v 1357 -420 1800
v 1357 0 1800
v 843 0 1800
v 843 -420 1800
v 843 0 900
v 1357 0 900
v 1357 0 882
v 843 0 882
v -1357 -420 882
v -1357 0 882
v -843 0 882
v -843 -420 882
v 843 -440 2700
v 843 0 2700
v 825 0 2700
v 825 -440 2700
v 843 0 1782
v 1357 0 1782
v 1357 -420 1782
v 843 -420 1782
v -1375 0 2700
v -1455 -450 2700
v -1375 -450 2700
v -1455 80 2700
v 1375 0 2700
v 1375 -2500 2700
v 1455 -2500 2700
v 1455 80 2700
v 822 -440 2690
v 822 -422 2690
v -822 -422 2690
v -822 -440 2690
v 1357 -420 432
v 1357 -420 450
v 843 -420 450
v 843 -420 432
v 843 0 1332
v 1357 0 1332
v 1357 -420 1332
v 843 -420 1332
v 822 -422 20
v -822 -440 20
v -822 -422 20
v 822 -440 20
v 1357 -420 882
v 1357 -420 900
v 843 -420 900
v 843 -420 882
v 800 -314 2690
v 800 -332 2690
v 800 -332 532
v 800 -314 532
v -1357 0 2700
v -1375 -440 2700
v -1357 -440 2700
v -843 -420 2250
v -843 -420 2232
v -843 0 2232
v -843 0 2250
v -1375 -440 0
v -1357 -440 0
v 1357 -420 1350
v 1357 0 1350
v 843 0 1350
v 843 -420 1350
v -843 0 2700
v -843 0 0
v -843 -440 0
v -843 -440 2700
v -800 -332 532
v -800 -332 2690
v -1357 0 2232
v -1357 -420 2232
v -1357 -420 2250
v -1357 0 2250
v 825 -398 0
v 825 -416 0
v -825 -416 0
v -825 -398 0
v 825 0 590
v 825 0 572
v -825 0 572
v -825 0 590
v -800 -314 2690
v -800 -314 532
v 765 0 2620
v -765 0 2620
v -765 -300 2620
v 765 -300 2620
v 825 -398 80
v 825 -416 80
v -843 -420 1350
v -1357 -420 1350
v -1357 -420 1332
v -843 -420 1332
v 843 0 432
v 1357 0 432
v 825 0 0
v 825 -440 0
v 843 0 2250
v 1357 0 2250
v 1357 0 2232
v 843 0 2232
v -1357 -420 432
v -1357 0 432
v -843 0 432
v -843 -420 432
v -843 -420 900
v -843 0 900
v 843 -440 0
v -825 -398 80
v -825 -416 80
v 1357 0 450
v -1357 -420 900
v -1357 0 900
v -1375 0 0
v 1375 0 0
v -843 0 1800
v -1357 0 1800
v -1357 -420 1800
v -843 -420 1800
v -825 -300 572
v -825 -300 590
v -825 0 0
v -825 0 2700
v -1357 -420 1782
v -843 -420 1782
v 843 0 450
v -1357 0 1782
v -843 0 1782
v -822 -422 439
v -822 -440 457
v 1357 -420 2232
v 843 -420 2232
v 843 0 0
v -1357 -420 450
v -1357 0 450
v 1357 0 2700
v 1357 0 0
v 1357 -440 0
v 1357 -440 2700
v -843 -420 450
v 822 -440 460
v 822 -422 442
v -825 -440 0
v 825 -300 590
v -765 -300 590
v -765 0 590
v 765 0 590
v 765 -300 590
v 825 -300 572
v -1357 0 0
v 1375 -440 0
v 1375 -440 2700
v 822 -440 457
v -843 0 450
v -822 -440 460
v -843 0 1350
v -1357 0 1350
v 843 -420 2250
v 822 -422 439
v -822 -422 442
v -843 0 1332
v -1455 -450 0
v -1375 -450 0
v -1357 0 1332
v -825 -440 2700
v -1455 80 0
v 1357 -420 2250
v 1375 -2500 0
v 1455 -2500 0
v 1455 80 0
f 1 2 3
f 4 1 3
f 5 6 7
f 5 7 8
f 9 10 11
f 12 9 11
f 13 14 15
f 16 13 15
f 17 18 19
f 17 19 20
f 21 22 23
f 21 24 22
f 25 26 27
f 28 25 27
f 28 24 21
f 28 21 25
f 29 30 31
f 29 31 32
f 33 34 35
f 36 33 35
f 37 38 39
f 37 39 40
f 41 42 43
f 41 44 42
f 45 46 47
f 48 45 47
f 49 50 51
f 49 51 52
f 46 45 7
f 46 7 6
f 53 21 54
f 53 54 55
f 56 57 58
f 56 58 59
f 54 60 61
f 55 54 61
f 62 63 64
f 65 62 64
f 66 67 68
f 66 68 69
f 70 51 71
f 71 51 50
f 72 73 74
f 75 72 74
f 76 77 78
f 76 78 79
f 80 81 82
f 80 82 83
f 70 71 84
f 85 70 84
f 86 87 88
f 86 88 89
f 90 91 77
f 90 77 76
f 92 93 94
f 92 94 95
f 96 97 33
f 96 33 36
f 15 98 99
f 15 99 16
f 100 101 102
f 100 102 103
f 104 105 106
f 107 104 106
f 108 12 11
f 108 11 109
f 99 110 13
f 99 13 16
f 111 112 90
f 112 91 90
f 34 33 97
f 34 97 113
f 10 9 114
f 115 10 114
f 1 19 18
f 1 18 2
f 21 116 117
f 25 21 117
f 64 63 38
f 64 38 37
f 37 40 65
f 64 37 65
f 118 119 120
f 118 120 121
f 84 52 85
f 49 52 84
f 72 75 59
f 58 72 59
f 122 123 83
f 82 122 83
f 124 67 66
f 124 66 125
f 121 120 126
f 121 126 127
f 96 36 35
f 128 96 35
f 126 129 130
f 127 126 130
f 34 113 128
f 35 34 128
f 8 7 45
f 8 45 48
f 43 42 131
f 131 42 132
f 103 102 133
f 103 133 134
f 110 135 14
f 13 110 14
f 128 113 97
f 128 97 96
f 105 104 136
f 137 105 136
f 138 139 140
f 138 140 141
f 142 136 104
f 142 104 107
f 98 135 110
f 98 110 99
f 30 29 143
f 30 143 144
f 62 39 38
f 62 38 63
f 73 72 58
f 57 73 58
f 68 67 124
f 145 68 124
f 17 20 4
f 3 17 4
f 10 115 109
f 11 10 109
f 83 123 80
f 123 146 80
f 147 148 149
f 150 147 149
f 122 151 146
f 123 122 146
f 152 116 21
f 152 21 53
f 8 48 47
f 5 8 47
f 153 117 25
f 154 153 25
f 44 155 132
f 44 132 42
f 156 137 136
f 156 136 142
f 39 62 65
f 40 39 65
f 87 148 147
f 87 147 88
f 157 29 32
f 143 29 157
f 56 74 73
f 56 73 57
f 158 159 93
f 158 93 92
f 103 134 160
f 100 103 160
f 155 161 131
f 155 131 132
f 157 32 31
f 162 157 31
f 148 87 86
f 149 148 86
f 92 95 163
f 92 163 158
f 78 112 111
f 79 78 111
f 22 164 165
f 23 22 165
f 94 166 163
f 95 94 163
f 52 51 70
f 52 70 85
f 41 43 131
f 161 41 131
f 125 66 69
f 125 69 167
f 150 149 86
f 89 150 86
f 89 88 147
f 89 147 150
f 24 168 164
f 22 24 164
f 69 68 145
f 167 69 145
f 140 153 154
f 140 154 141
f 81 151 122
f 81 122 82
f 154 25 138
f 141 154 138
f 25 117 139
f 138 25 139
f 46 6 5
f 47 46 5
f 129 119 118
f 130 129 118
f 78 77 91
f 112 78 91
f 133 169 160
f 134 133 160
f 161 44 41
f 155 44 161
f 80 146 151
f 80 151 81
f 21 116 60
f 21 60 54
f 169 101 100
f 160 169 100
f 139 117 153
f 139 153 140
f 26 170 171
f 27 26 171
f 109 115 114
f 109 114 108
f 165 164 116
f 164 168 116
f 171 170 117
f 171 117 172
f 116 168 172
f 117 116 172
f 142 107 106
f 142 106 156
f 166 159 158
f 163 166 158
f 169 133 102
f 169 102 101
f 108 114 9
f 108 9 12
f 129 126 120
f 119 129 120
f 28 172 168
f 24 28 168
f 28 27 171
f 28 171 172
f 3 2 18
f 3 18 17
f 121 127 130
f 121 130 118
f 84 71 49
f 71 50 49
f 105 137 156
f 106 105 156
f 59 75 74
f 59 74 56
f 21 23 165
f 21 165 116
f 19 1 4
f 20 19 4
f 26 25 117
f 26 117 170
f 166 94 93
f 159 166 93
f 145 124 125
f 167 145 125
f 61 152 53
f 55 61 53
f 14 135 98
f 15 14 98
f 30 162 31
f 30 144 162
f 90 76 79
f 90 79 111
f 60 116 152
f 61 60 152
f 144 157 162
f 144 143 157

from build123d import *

# Parameters (mm, degrees)
F1_DEPTH       = 2700
F2_W           = 1530
F2_H           = 2030
F3_DEPTH       = 300
F4_W           = 18
F4_H           = 2700
F5_DEPTH       = 440
F6_W           = 18
F6_H           = 2700
F7_DEPTH       = 440
F8_W           = 514
F8_H           = 18
F9_DEPTH       = 420
F12_DEPTH      = 822
F12_DEPTH_BACK = 822
F13_W          = 300
F13_H          = 18
F14_DEPTH      = 825
F14_DEPTH_BACK = 825
F16_DEPTH      = 822
F16_DEPTH_BACK = 822
F17_W          = 18
F17_H          = 80
F18_DEPTH      = 825
F18_DEPTH_BACK = 825
F19_W          = 18
F19_H          = 2158
F20_DEPTH      = 800
F20_DEPTH_BACK = 800


with BuildPart() as f1:
    # F0 (on Top) → F1 (new body)
    with BuildSketch(Plane.XY):
        Polygon((-1455, -450), (-1375, -450), (-1375, 0), (1375, 0), (1375, -2500), (1455, -2500), (1455, 80), (-1455, 80), align=None)
    extrude(amount=F1_DEPTH)


with BuildPart() as f3:
    # F2 (on Front) → F3 (new body)
    with BuildSketch(Plane.XZ):
        with Locations((0, 1605)):
            Rectangle(F2_W, F2_H)
    extrude(amount=F3_DEPTH)


with BuildPart() as f5:
    # F4 (on Front) → F5 (new body)
    with BuildSketch(Plane.XZ):
        with Locations((-834, 1350)):
            Rectangle(F4_W, F4_H)
    extrude(amount=F5_DEPTH)


with BuildPart() as f7:
    # F6 (on Front) → F7 (new body)
    with BuildSketch(Plane.XZ):
        with Locations((-1366, 1350)):
            Rectangle(F6_W, F6_H)
    extrude(amount=F7_DEPTH)


with BuildPart() as f9:
    # F8 (on Front) → F9 (new body)
    with BuildSketch(Plane.XZ):
        with Locations((-1100, 2241)):
            Rectangle(F8_W, F8_H)
    extrude(amount=F9_DEPTH)


with BuildPart() as f9b:
    # F8 (on Front) → F9, piece 2 (new body)
    with BuildSketch(Plane.XZ):
        with Locations((-1100, 1791)):
            Rectangle(F8_W, F8_H)
    extrude(amount=F9_DEPTH)


with BuildPart() as f9c:
    # F8 (on Front) → F9, piece 3 (new body)
    with BuildSketch(Plane.XZ):
        with Locations((-1100, 1341)):
            Rectangle(F8_W, F8_H)
    extrude(amount=F9_DEPTH)


with BuildPart() as f9d:
    # F8 (on Front) → F9, piece 4 (new body)
    with BuildSketch(Plane.XZ):
        with Locations((-1100, 891)):
            Rectangle(F8_W, F8_H)
    extrude(amount=F9_DEPTH)


with BuildPart() as f9e:
    # F8 (on Front) → F9, piece 5 (new body)
    with BuildSketch(Plane.XZ):
        with Locations((-1100, 441)):
            Rectangle(F8_W, F8_H)
    extrude(amount=F9_DEPTH)


with BuildPart() as f10_1:
    # F10: instance of F7
    add(f7.part.mirror(Plane.YZ))


with BuildPart() as f10_2:
    # F10: instance of F5
    add(f5.part.mirror(Plane.YZ))


with BuildPart() as f10_3:
    # F10: instance of F9
    add(f9.part.mirror(Plane.YZ))


with BuildPart() as f10_4:
    # F10: instance of F9b
    add(f9b.part.mirror(Plane.YZ))


with BuildPart() as f10_5:
    # F10: instance of F9c
    add(f9c.part.mirror(Plane.YZ))


with BuildPart() as f10_6:
    # F10: instance of F9d
    add(f9d.part.mirror(Plane.YZ))


with BuildPart() as f10_7:
    # F10: instance of F9e
    add(f9e.part.mirror(Plane.YZ))


with BuildPart() as f12:
    # F11 (on Right) → F12 (new body, two sides)
    with BuildSketch(Plane.YZ) as f12_sk:
        Polygon((-422, 442), (-422, 2690), (-440, 2690), (-440, 460), align=None)
    extrude(amount=F12_DEPTH)
    extrude(f12_sk.sketch, amount=-F12_DEPTH_BACK)


with BuildPart() as f14:
    # F13 (on Right) → F14 (new body, two sides)
    with BuildSketch(Plane.YZ) as f14_sk:
        with Locations((-150, 581)):
            Rectangle(F13_W, F13_H)
    extrude(amount=F14_DEPTH)
    extrude(f14_sk.sketch, amount=-F14_DEPTH_BACK)


with BuildPart() as f16:
    # F15 (on Right) → F16 (new body, two sides)
    with BuildSketch(Plane.YZ) as f16_sk:
        Polygon((-422, 20), (-422, 439), (-440, 457), (-440, 20), align=None)
    extrude(amount=F16_DEPTH)
    extrude(f16_sk.sketch, amount=-F16_DEPTH_BACK)


with BuildPart() as f18:
    # F17 (on Right) → F18 (new body, two sides)
    with BuildSketch(Plane.YZ) as f18_sk:
        with Locations((-407, 40)):
            Rectangle(F17_W, F17_H)
    extrude(amount=F18_DEPTH)
    extrude(f18_sk.sketch, amount=-F18_DEPTH_BACK)


with BuildPart() as f20:
    # F19 (on Right) → F20 (new body, two sides)
    with BuildSketch(Plane.YZ) as f20_sk:
        with Locations((-323, 1611)):
            Rectangle(F19_W, F19_H)
    extrude(amount=F20_DEPTH)
    extrude(f20_sk.sketch, amount=-F20_DEPTH_BACK)


solid = Compound([f1.part, f3.part, f5.part, f7.part, f9.part, f9b.part, f9c.part, f9d.part, f9e.part, f10_1.part, f10_2.part, f10_3.part, f10_4.part, f10_5.part, f10_6.part, f10_7.part, f12.part, f14.part, f16.part, f18.part, f20.part])
